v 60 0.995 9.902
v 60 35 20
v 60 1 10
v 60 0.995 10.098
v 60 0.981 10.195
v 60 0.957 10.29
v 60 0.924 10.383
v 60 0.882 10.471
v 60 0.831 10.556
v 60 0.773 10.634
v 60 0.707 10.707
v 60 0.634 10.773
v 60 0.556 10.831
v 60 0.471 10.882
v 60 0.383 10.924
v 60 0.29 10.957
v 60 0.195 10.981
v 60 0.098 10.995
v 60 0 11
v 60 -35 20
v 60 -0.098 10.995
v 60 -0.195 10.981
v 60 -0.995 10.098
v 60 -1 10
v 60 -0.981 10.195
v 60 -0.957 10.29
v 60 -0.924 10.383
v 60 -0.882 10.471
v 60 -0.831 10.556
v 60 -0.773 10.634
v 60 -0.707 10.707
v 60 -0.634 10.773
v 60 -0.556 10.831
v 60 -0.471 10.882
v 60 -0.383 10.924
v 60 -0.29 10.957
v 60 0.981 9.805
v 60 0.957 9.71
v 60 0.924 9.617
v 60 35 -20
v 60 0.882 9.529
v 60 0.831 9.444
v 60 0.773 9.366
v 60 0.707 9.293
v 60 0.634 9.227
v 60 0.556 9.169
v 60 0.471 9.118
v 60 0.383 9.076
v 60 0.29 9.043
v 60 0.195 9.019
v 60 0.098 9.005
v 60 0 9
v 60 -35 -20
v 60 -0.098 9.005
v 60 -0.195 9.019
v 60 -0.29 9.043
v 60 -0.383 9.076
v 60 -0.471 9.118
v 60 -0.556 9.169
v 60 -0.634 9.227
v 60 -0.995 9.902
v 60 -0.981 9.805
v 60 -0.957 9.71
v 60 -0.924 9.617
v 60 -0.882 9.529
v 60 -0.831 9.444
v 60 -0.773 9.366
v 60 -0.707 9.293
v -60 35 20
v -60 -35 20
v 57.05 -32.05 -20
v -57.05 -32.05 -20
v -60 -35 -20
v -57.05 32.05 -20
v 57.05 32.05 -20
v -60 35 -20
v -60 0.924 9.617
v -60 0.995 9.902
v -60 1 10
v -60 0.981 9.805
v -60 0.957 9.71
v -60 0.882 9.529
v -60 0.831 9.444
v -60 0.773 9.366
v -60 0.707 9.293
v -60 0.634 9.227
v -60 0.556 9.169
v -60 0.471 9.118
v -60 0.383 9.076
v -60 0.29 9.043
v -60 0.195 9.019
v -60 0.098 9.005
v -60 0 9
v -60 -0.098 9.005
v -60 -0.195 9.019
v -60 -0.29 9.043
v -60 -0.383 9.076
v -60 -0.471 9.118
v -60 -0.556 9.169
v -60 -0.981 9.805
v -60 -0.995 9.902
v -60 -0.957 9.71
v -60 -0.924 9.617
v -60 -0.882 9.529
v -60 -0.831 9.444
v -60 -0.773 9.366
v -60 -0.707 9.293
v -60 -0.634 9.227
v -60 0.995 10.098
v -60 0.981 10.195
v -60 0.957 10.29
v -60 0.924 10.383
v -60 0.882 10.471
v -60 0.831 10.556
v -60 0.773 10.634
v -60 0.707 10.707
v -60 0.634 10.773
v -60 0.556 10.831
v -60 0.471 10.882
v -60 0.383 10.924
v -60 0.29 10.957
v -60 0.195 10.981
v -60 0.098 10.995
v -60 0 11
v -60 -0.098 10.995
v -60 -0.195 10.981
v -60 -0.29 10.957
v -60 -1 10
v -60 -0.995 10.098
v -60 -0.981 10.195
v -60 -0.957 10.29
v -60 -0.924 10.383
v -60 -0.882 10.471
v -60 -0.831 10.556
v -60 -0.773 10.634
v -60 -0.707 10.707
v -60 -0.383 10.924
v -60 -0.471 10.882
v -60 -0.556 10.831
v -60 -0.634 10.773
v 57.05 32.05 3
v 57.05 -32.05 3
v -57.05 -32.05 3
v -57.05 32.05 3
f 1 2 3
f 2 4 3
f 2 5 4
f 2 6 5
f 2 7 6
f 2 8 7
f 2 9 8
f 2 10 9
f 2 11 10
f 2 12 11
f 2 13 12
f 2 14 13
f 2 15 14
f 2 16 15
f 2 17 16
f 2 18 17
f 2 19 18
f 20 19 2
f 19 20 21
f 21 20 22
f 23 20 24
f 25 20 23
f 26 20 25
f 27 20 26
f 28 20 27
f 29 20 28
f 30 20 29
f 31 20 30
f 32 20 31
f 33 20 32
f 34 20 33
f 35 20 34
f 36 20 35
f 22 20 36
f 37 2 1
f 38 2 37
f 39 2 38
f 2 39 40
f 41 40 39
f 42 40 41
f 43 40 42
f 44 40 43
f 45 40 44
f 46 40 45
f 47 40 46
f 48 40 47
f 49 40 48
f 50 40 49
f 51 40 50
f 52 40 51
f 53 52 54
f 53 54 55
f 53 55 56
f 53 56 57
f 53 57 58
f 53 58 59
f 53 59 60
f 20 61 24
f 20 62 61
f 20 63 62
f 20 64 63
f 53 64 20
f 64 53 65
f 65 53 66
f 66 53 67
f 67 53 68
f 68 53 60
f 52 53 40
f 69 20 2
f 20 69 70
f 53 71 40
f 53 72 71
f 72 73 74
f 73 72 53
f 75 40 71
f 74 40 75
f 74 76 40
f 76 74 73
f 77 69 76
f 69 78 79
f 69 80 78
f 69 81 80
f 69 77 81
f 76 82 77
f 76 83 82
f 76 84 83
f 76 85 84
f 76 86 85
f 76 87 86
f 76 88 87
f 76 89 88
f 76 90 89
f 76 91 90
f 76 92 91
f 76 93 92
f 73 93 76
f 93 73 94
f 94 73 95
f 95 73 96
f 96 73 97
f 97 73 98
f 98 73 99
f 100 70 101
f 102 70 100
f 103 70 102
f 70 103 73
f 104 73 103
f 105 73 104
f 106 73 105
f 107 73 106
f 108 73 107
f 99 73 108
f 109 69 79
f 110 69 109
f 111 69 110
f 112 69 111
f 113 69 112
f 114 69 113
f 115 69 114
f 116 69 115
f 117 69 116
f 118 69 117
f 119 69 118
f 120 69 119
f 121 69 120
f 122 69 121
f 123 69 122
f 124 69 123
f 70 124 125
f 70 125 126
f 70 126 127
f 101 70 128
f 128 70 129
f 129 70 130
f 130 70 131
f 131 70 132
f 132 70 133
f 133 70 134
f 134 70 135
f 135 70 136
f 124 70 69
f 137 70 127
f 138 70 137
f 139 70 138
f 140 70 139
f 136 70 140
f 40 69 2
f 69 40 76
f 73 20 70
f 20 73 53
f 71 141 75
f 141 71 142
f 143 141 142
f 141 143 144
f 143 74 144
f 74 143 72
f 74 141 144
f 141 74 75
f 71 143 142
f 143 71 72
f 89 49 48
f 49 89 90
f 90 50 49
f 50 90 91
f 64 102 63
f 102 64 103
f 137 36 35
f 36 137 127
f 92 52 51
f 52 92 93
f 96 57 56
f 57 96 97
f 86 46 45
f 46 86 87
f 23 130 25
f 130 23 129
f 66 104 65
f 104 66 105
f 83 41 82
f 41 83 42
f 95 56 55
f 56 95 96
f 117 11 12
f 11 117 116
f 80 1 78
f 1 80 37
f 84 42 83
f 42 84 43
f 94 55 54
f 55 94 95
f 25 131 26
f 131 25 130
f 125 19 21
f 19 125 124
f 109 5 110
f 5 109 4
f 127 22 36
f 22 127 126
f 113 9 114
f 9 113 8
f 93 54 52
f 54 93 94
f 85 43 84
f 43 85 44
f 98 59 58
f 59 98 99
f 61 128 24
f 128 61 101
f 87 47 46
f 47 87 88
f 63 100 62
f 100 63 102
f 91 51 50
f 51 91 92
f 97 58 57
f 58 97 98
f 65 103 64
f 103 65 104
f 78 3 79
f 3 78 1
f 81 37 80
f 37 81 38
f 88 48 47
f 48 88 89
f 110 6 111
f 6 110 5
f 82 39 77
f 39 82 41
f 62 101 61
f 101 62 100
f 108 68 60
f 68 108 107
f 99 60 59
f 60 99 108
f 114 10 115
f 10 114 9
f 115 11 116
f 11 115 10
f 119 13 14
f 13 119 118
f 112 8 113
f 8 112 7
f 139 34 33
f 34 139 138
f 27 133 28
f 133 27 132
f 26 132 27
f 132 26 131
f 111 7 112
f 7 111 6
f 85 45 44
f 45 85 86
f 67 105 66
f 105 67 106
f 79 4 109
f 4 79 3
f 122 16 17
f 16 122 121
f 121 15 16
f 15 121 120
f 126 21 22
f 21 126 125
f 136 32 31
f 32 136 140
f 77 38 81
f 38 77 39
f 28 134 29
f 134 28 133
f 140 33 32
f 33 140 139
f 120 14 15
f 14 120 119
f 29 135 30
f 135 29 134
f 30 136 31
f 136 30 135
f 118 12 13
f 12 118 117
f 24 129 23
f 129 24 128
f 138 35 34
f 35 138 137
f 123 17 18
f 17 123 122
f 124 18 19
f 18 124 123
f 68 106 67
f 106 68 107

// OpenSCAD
// --- Dimensions (mm) ---
outer_x = 120;          // Total length of the tank
outer_y = 70;           // Total width of the tank
outer_z = 40;           // Total height of the tank

wall_thickness = 3;     // Thickness of the walls and floor
floor_thickness = 3;    // Thickness of the floor

platform_length = 60;   // Length of the central platform (X direction)
platform_height = 13;   // Height of the platform top from the inner floor
platform_width = outer_y - (2 * wall_thickness); // Spans full inner width

hole_diameter = 2;      // Diameter of electrode wire holes
hole_y_pos = 0;         // Y position of holes (centered on Y axis)
hole_z_pos = 30;        // Z position of holes (from bottom of tank)

// --- Resolution ---
$fn = 64;

// --- Model Construction ---

// We build the part by creating the solid shell and platform first,
// then subtracting the inner cavity and the electrode holes.

difference() {
    // 1. The Solid Body (Outer shell + Internal Platform)
    union() {
        // The main outer block
        cube([outer_x, outer_y, outer_z], center = true);

        // The Platform (Solid piece in the middle)
        // The platform top is 13mm above the inner floor.
        // Inner floor is at: -outer_z/2 + floor_thickness
        // Platform top is at: -outer_z/2 + floor_thickness + platform_height
        // We center the cube on its Z-midpoint.
        translate([0, 0, (-outer_z/2 + floor_thickness + platform_height/2)])
            cube([platform_length, platform_width, platform_height], center = true);
    }

    // 2. The Inner Cavity (The space where buffer goes)
    // We subtract this to create the hollow tank.
    // We extend it slightly in Z to ensure a clean cut at the top.
    translate([0, 0, -outer_z/2 + floor_thickness])
        cube([outer_x - 2*wall_thickness + 0.1, outer_y - 2*wall_thickness + 0.1, outer_z], center = true);

    // 3. The Electrode Holes
    // These are drilled through the X-end walls.
    // We extend the cylinder past the boundaries to ensure a clean cut.
    translate([0, hole_y_pos, hole_z_pos - outer_z/2])
        rotate([0, 90, 0])
            cylinder(d = hole_diameter, h = outer_x + 2, center = true);
}

// Note on coordinate system:
// The model is centered on the origin (0,0,0).
// The bottom of the tank is at Z = -20.
// The floor is at Z = -17.
// The electrode holes are at Z = 30 relative to the bottom, 
// which means Z = -20 + 30 = 10 in the global coordinate system.
// To match the user's "Z=30" instruction relative to the bottom:
// I have translated the hole to (hole_z_pos - outer_z/2).
